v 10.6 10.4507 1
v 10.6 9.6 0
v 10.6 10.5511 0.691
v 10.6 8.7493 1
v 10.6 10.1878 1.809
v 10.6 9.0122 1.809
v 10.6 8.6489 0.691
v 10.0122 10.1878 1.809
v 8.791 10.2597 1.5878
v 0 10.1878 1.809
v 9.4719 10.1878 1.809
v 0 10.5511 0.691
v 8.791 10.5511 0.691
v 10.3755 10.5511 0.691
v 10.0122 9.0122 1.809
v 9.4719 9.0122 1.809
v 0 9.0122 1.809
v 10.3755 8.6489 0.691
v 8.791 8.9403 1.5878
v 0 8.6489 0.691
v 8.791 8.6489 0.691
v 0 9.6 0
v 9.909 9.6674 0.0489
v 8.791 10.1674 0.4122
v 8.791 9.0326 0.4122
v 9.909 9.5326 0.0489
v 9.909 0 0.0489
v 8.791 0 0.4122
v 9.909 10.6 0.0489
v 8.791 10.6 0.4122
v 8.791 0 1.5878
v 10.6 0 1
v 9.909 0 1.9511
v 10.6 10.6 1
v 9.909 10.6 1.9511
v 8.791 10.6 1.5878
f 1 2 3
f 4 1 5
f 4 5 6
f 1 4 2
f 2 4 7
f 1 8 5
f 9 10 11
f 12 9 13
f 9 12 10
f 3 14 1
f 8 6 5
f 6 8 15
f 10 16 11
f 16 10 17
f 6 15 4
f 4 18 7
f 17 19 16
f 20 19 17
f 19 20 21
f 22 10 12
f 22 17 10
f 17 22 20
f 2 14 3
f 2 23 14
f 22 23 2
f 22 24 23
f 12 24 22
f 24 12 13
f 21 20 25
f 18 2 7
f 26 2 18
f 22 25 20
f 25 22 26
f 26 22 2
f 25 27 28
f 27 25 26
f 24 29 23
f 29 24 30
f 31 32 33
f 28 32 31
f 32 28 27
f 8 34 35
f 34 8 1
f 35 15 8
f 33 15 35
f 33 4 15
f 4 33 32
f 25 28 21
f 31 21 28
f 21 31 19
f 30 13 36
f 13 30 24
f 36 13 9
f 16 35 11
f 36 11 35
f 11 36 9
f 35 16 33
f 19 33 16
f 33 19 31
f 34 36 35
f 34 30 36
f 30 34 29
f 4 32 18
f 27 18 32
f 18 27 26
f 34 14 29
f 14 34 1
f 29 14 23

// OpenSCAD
/*
difference() {
cube([10,10,2], center=true);

cylinder(h = 2, r = 5, center=true, $fn = 100);

translate([0,-2.5,0])
cube([10,5,2], center=true);

translate([-5,-5,0])
#cube([5,10,2], center=true);
}


difference () {
translate([8,2,0])
cube([2,2,2]);
translate([8,4,0])
cylinder(h = 2, r = 2, $fn = 100);}

*/

/*
translate([0,9,1])
rotate ([0,90,0])
cylinder(h = 20, r = 1); //, $fn = 100);

translate([20,9,1])
sphere(r = 1); //, $fn = 100);

translate([20,9,1])
rotate ([90,0,0])
cylinder(h = 20, r = 1); //, $fn = 100);


translate([20,9,1])
sphere(r = 1); //, $fn = 100);

translate([20,9,1])
cube([5,5,2]);
*/

// hypotenuse = 10,606601717798212866012665431573

translate([0,9.6,1])
rotate ([0,90,0])
cylinder(h = 10.6, r = 1); //, $fn = 100);


translate([9.6,10.6,1])
rotate ([90,0,0])
cylinder(h = 10.6, r = 1); //, $fn = 100);
